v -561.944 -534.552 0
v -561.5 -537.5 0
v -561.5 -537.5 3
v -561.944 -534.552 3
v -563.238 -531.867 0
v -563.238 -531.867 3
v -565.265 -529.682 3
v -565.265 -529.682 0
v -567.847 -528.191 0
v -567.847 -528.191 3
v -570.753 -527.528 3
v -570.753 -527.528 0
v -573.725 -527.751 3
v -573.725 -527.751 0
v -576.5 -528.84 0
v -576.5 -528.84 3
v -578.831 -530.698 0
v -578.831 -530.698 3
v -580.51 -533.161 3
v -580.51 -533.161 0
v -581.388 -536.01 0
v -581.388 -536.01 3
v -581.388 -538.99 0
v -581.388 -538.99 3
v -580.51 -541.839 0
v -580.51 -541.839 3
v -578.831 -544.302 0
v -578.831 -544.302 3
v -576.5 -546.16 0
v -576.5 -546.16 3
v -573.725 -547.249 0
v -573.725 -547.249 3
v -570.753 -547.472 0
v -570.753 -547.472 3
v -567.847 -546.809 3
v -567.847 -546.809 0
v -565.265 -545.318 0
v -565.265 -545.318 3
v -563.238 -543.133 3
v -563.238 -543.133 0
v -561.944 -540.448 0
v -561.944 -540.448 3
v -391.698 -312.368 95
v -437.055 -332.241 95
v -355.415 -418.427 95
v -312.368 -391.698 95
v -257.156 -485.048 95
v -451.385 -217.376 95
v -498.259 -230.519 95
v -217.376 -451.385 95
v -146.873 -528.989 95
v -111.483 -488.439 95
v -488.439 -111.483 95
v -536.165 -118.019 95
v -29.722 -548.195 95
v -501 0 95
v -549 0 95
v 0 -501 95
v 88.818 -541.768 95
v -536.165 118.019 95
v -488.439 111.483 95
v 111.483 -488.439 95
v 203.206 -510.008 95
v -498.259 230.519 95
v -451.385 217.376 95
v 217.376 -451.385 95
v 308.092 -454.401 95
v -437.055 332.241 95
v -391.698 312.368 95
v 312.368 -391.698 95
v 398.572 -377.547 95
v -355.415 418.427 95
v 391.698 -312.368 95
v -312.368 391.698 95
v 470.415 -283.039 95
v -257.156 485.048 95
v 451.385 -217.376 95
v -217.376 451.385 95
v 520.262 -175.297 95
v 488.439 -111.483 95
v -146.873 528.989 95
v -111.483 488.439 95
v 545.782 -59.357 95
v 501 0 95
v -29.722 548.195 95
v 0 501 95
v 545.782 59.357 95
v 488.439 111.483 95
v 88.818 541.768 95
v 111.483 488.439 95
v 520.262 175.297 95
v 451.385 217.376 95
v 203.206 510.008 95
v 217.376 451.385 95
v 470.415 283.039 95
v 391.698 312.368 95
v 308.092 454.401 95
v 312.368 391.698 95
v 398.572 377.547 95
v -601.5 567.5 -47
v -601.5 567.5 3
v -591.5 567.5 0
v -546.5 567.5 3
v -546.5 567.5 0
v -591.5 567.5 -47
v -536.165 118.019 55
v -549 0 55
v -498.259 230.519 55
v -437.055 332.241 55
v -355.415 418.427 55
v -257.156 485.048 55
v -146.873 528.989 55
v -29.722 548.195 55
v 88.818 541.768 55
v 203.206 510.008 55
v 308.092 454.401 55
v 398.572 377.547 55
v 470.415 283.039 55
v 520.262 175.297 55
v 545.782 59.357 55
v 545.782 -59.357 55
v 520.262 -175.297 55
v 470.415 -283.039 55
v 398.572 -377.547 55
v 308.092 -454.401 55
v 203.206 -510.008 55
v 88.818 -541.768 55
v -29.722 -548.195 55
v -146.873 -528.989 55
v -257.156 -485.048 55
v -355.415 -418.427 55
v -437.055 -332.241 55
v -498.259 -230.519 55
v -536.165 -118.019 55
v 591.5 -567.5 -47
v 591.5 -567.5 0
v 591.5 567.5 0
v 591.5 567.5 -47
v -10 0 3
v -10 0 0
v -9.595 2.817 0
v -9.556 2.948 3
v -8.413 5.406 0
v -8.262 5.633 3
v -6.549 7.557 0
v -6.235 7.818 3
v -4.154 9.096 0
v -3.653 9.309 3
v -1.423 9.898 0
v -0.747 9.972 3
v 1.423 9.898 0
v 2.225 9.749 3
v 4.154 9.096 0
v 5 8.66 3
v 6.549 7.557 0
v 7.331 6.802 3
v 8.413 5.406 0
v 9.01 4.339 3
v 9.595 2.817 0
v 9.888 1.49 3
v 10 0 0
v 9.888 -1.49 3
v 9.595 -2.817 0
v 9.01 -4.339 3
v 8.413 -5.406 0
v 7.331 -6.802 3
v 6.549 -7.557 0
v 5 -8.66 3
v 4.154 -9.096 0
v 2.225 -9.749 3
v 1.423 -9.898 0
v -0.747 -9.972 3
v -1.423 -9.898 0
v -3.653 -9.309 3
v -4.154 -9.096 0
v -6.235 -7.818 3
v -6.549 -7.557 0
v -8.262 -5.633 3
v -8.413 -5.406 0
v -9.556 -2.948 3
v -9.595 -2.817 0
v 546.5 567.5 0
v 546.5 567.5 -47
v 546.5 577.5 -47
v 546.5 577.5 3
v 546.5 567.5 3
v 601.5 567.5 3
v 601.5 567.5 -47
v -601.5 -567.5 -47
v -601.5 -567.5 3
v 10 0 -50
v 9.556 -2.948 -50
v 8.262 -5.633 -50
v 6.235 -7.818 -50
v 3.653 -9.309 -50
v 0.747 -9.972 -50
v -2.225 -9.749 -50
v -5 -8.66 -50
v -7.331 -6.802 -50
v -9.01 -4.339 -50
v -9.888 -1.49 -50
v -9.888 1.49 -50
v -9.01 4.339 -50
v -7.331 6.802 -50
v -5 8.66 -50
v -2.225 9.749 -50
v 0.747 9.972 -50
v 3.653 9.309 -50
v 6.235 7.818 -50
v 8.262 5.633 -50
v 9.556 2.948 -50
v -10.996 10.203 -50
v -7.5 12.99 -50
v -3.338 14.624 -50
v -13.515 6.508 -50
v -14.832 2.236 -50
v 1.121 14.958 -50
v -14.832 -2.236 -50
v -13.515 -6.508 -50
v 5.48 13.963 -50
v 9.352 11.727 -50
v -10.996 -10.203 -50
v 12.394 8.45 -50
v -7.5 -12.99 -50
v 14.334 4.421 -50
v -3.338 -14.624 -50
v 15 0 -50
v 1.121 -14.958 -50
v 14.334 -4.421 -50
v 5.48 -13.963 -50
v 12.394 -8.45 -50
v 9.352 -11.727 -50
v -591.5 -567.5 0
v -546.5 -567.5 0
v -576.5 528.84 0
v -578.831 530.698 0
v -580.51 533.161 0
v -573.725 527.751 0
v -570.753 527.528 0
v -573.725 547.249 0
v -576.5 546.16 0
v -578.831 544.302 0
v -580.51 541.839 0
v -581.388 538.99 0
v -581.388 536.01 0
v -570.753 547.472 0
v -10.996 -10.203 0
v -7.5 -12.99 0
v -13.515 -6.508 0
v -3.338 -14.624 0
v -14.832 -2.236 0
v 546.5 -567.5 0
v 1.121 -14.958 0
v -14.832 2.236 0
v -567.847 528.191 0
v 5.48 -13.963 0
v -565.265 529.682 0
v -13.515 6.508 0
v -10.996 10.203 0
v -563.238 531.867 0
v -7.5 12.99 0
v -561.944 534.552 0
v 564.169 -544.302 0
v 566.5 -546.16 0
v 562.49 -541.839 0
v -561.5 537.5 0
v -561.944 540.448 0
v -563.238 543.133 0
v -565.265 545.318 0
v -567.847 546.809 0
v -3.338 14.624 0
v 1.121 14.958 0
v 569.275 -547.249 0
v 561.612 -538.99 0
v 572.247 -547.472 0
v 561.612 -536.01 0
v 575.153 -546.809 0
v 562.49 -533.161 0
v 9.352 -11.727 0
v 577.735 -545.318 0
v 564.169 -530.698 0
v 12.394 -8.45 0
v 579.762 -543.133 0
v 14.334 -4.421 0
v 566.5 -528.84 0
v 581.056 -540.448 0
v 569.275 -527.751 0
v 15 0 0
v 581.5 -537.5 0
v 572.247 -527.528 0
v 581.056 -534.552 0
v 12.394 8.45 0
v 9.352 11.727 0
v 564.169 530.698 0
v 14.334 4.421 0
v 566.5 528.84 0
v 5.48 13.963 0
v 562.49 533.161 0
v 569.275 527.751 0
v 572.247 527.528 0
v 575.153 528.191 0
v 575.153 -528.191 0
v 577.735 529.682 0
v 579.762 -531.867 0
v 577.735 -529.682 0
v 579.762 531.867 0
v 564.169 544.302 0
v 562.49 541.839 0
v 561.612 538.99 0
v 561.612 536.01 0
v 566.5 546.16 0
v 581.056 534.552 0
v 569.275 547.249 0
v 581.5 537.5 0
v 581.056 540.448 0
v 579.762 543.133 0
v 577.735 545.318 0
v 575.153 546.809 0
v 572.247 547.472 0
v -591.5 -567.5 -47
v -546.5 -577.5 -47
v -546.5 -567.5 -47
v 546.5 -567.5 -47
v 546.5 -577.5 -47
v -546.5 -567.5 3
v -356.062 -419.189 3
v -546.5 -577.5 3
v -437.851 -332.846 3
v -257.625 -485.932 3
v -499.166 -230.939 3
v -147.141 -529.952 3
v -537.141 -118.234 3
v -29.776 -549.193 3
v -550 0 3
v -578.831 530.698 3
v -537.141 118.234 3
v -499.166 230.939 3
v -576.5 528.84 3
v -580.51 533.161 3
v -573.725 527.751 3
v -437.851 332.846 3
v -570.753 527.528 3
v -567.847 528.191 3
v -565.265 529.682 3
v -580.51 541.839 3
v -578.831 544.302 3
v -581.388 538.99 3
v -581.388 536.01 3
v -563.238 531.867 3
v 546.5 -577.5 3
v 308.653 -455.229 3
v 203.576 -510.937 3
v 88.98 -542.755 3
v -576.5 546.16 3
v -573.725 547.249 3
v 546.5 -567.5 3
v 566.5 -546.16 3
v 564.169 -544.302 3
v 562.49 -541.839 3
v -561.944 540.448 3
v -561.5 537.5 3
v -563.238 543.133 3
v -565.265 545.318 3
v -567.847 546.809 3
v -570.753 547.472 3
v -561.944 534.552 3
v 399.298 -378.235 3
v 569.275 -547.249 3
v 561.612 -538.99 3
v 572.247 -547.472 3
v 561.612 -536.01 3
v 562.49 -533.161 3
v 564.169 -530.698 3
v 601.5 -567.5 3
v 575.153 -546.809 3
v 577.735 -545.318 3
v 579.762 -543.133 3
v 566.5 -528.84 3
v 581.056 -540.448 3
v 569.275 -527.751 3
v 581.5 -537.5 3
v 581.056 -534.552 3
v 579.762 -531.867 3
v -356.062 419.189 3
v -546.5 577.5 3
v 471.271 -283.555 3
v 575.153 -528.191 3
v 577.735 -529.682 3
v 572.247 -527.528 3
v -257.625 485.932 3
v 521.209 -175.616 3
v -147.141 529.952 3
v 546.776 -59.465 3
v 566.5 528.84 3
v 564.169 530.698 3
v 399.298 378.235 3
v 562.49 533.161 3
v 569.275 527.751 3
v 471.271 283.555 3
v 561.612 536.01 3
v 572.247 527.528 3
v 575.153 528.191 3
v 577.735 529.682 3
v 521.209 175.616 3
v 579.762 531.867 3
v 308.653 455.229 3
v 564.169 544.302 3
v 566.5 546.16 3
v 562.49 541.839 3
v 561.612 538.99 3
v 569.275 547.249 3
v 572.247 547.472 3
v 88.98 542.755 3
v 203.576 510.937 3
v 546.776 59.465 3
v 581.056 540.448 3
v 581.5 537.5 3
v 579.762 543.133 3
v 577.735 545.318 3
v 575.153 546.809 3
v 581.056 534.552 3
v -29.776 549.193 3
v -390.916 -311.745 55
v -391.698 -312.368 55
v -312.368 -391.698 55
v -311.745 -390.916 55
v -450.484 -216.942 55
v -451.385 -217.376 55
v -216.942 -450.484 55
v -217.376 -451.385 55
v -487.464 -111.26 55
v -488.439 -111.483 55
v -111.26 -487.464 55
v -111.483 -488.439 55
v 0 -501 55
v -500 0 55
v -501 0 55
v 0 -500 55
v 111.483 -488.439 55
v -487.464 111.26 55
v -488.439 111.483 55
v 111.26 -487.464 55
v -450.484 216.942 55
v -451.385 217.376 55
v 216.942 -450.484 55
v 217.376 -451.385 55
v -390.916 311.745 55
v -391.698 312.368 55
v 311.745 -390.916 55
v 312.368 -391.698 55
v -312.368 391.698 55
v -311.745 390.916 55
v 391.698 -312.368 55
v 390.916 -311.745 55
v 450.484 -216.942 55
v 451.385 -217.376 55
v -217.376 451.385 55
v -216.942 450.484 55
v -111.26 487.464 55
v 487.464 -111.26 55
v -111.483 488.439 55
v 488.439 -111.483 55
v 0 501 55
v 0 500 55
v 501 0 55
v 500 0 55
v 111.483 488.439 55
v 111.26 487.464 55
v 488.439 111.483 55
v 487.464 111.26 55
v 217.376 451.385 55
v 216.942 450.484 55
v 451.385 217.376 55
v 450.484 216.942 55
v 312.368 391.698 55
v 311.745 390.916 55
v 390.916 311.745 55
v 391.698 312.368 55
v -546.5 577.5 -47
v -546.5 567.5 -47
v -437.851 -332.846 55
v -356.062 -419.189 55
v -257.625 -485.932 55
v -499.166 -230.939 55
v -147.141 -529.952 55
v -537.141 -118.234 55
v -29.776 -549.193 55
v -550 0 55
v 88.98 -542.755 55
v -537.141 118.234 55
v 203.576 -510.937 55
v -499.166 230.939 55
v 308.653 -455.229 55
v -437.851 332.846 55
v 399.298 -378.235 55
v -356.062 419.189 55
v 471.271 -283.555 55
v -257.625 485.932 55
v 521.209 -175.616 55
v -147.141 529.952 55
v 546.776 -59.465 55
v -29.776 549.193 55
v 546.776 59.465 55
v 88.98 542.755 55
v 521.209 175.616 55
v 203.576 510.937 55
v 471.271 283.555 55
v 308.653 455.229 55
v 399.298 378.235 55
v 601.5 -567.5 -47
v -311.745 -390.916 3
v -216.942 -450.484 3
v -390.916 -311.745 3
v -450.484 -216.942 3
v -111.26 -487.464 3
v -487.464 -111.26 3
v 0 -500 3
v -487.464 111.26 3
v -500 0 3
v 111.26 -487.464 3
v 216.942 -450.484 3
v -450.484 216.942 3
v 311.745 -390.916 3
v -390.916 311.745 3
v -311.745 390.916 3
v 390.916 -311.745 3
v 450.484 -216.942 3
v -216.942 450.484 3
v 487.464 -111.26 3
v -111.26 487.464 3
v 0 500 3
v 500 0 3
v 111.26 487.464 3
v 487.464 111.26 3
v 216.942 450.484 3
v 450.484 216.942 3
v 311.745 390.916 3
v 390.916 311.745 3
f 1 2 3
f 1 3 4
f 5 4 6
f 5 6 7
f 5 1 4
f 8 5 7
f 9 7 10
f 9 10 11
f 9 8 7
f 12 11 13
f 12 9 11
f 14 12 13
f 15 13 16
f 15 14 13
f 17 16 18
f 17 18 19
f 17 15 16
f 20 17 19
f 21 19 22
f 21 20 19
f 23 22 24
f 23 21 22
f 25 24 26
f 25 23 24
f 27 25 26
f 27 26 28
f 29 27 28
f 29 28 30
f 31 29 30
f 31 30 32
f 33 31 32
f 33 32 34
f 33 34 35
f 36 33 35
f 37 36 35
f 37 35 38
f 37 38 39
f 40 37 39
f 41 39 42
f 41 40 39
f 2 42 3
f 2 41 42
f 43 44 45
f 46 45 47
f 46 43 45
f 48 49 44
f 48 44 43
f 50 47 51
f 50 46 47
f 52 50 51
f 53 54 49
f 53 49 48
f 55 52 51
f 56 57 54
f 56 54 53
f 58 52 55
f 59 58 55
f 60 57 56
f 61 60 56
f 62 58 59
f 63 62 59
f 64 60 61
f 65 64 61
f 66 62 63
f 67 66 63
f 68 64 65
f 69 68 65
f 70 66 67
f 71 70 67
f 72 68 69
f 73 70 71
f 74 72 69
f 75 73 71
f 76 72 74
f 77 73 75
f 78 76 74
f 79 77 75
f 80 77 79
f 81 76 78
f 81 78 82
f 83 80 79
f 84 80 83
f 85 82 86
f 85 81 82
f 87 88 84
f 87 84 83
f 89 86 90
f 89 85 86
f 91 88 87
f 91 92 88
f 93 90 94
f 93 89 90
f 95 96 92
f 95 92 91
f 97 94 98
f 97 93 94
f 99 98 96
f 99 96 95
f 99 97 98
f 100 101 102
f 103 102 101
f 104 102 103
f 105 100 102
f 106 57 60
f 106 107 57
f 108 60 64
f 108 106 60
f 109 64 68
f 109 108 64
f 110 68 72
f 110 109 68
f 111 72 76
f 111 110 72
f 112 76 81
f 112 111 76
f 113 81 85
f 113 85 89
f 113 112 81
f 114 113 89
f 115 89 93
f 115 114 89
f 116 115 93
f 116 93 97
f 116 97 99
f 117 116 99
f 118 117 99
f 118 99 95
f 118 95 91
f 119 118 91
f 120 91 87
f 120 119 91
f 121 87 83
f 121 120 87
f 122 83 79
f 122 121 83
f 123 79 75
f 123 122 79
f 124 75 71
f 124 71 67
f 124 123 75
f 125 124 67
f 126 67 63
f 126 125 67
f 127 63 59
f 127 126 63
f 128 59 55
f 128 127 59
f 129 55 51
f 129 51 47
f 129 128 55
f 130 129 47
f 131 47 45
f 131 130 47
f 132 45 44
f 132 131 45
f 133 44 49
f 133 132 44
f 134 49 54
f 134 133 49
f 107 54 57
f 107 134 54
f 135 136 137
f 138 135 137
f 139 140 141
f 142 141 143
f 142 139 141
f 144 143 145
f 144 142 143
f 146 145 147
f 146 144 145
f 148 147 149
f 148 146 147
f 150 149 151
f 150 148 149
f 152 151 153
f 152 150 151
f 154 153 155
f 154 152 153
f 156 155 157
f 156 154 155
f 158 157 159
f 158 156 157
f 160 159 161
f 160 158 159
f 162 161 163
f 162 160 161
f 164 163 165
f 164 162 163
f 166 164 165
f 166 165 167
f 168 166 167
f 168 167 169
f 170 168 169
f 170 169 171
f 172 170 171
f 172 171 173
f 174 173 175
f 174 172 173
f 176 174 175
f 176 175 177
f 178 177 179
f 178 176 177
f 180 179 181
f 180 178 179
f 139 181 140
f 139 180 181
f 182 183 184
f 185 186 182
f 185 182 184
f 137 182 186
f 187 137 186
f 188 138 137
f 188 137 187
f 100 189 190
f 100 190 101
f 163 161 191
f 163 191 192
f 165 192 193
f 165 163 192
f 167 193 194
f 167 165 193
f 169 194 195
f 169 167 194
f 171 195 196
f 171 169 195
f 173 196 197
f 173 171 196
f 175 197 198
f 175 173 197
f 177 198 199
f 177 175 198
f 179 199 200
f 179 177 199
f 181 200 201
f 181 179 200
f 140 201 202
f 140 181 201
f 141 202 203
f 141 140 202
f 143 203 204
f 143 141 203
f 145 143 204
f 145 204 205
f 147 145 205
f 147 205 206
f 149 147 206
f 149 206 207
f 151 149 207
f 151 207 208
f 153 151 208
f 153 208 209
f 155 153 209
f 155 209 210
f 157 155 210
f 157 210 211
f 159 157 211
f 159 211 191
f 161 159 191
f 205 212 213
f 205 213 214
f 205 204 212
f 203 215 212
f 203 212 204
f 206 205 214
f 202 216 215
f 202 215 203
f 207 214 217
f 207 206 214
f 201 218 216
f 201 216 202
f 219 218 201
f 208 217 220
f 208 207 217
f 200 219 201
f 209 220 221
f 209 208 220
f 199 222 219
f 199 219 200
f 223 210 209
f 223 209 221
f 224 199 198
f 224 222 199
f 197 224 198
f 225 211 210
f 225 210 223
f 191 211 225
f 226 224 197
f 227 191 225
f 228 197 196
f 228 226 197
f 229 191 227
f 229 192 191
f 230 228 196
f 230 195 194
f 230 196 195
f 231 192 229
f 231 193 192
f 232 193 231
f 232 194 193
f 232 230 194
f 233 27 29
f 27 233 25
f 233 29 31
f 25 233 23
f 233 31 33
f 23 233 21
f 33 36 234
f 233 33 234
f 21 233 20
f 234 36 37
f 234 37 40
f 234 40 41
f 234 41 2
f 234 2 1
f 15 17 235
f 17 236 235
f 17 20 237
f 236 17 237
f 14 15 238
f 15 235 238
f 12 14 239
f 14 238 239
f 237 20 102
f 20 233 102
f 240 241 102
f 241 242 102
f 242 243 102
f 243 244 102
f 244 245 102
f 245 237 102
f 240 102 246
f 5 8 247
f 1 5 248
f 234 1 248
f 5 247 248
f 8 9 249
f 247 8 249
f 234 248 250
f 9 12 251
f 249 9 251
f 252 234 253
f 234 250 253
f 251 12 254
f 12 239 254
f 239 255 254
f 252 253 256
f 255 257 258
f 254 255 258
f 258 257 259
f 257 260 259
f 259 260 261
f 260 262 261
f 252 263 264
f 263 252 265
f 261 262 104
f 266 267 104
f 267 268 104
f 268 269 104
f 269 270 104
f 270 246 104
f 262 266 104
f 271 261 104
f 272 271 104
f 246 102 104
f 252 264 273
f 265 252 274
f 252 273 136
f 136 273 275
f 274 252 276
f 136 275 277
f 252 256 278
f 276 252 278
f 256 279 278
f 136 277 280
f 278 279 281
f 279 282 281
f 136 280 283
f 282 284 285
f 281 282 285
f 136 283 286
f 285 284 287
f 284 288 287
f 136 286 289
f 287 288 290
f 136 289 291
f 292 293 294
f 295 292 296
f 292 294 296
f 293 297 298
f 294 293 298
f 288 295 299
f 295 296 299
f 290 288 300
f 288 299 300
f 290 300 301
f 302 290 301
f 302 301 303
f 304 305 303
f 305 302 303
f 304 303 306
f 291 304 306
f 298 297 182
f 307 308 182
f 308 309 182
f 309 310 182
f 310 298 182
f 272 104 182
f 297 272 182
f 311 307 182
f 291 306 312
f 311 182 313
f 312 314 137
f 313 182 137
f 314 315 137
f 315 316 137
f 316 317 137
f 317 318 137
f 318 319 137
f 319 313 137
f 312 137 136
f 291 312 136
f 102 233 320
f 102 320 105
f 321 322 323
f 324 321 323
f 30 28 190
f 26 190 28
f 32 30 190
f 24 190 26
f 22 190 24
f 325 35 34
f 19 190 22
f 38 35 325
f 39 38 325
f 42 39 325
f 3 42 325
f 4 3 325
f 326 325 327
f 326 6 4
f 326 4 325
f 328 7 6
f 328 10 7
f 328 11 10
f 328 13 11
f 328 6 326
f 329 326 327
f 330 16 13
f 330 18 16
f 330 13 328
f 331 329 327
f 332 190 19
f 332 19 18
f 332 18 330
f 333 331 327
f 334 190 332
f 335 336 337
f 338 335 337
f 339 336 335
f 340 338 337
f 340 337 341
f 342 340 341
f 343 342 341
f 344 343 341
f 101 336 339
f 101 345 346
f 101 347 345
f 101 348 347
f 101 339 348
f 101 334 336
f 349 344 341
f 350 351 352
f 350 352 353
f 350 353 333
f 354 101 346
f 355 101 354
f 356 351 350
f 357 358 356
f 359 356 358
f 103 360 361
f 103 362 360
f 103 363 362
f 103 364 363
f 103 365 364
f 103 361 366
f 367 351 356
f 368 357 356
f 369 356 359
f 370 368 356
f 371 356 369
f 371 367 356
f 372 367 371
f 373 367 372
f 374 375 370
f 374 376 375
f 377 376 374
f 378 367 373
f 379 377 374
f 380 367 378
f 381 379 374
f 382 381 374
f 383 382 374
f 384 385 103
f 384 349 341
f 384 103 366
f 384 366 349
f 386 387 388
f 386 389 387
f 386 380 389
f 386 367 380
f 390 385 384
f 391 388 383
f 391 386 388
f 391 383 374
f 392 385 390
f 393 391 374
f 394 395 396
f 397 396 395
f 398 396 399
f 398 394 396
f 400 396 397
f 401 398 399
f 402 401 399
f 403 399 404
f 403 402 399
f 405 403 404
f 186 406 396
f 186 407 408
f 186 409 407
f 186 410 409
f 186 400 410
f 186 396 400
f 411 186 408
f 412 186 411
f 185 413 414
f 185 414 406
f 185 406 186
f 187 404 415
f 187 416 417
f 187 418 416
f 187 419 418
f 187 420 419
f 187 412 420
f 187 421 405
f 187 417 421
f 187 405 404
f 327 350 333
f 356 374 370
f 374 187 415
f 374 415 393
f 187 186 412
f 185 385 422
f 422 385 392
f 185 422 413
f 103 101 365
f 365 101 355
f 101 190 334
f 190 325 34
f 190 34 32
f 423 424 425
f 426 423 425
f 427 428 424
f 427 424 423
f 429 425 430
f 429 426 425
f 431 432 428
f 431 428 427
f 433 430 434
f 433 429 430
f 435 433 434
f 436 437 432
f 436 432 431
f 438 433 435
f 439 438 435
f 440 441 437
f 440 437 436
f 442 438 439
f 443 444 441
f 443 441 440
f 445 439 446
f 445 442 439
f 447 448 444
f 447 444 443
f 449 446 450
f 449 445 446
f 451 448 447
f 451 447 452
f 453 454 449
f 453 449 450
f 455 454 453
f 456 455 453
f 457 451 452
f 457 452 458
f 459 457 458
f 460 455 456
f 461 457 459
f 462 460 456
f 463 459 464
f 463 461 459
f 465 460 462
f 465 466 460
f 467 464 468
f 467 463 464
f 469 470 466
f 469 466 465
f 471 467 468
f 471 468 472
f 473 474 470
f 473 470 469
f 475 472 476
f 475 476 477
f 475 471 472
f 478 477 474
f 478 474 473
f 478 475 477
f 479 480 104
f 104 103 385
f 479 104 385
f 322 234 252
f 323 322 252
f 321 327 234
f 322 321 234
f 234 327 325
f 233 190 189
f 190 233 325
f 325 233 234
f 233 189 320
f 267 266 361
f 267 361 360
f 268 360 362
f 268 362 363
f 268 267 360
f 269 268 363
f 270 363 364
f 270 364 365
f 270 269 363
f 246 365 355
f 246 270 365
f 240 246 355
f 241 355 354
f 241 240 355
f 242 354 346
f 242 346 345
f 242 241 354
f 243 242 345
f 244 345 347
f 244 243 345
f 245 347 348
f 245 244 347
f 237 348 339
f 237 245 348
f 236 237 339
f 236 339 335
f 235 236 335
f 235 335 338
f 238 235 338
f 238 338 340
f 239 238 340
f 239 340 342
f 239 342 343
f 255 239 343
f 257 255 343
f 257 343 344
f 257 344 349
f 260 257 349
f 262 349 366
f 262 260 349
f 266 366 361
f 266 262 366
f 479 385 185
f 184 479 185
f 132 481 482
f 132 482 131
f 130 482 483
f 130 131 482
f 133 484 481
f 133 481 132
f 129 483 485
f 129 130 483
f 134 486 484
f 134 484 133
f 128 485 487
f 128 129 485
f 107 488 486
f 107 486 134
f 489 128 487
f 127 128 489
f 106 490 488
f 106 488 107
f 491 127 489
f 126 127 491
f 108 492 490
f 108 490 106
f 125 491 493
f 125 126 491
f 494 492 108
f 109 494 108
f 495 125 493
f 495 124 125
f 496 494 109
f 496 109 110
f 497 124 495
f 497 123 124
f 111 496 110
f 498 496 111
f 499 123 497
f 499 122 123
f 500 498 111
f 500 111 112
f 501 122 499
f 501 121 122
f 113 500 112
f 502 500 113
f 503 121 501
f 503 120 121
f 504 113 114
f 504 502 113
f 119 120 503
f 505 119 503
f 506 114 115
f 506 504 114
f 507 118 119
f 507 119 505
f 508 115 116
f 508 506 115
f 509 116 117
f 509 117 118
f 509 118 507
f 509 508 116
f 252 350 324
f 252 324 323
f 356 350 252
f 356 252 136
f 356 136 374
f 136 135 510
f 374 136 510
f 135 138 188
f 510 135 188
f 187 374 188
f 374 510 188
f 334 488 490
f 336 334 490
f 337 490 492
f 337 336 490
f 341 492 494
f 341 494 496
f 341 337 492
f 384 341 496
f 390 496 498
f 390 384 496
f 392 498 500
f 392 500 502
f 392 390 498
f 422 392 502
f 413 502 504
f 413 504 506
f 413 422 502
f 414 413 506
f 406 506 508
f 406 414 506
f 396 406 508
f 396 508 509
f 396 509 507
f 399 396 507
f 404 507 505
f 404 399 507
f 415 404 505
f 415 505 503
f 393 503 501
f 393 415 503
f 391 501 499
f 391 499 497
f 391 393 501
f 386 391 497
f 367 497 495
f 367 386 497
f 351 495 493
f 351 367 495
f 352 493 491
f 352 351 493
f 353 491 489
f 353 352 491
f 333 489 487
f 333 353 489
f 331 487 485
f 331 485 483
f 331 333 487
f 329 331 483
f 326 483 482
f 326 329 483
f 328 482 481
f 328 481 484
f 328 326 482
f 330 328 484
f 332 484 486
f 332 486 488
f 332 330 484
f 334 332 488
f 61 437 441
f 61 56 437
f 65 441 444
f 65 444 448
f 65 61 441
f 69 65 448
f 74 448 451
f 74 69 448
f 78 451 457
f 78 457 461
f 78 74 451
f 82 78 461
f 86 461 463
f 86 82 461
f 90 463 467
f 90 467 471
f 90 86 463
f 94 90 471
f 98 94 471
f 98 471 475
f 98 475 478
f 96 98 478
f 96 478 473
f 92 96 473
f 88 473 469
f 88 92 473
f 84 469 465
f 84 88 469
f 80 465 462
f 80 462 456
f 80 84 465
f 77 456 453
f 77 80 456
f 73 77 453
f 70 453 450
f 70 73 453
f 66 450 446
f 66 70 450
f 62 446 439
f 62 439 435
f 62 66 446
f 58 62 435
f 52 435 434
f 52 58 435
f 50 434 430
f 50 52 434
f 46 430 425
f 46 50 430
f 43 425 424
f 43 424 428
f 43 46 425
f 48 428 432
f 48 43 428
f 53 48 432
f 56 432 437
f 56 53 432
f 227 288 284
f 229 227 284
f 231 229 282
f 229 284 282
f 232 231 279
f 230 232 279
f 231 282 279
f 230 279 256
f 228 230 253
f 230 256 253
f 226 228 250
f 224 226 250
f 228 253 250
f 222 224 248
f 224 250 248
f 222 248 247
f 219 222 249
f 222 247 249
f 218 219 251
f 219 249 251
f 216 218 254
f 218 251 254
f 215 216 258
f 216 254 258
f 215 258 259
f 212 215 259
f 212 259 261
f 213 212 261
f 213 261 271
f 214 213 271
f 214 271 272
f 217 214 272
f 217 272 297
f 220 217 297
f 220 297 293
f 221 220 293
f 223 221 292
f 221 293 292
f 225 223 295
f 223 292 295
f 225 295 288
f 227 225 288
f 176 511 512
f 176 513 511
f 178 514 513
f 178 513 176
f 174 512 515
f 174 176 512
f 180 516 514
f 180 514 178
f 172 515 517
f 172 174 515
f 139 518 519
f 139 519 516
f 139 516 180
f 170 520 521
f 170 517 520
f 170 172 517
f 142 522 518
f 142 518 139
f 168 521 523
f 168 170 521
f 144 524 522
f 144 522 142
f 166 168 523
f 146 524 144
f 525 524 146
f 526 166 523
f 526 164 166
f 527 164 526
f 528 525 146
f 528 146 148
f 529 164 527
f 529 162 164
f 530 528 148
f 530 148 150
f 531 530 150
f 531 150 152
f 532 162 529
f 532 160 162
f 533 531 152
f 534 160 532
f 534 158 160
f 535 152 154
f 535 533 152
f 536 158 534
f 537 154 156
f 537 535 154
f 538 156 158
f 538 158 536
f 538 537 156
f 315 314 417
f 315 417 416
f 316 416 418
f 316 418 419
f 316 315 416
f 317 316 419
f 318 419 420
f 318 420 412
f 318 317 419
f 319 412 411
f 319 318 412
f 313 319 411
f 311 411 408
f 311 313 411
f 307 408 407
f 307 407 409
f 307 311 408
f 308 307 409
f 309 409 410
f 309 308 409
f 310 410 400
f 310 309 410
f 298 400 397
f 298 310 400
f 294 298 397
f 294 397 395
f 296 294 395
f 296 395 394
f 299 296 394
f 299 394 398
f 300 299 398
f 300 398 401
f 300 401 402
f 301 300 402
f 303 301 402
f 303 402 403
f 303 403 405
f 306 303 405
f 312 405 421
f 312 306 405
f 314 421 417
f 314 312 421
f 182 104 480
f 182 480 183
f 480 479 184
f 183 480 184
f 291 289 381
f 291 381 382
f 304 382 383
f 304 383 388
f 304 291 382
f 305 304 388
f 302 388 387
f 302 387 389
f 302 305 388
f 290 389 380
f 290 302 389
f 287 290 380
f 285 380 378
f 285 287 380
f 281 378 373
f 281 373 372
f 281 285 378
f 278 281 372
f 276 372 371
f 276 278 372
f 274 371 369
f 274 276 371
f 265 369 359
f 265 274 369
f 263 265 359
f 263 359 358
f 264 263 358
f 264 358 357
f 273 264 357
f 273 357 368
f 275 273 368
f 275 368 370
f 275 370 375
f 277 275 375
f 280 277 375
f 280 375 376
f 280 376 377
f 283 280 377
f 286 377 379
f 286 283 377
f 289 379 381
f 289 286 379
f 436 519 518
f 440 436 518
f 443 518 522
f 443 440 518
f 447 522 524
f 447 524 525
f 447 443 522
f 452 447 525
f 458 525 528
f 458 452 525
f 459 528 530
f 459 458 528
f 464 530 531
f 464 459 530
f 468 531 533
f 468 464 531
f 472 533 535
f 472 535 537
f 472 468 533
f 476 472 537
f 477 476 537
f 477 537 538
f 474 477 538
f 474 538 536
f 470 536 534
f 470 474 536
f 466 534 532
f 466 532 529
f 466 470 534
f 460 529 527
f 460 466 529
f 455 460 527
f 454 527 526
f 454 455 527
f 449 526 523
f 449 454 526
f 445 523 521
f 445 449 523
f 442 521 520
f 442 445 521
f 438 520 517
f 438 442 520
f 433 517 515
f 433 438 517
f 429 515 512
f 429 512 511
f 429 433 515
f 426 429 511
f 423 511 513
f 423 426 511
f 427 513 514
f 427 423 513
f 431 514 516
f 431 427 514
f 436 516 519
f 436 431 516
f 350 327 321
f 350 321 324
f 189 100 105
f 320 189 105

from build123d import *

# Parameters (mm, degrees)
F2_W     = 1203
F2_H     = 1135
F2_R     = 10
F2_R_2   = 501
F3_DEPTH = 3
F4_W     = 1093
F4_H     = 10
F4_W_2   = 10
F4_H_2   = 1135
F5_DEPTH = 50
F6_R     = 15
F6_R_2   = 10
F7_DEPTH = 50


with BuildPart() as f1:
    # F0 (on Front) → F1 (revolve)
    with BuildSketch(Plane.XZ):
        Polygon((-550, 3), (-500, 3), (-500, 55), (-501, 55), (-501, 95), (-549, 95), (-549, 55), (-550, 55), align=None)
        Polygon((-10, 3), (-500, 3), (-550, 3), (-550, 0), (-10, 0), align=None)
    revolve(axis=Axis((0, 0, 187.921241), (0, 0, -1)))

    # F2 (on Top) → F3 (join)
    with BuildSketch(Plane.XY):
        Rectangle(F2_W, F2_H)
        with Locations((-571.5, -537.5)):
            Circle(F2_R, mode=Mode.SUBTRACT)
        with Locations((571.5, -537.5)):
            Circle(F2_R, mode=Mode.SUBTRACT)
        with Locations((-571.5, 537.5)):
            Circle(F2_R, mode=Mode.SUBTRACT)
        Circle(F2_R_2, mode=Mode.SUBTRACT)
        with Locations((571.5, 537.5)):
            Circle(F2_R, mode=Mode.SUBTRACT)
    extrude(amount=F3_DEPTH)

    # F4 (on face) → F5 (join)
    with BuildSketch(Plane.XY.offset(3)):
        with Locations((0, -572.5)):
            Rectangle(F4_W, F4_H)
        with Locations((-596.5, 0)):
            Rectangle(F4_W_2, F4_H_2)
        with Locations((0, 572.5)):
            Rectangle(F4_W, F4_H)
        with Locations((596.5, 0)):
            Rectangle(F4_W_2, F4_H_2)
    extrude(amount=-F5_DEPTH)

    # F6 (on face) → F7 (join)
    with BuildSketch(Plane(origin=(0, 0, 0), x_dir=(1, 0, 0), z_dir=(0, 0, -1))):
        Circle(F6_R)
        Circle(F6_R_2, mode=Mode.SUBTRACT)
    extrude(amount=F7_DEPTH)


solid = f1.part
